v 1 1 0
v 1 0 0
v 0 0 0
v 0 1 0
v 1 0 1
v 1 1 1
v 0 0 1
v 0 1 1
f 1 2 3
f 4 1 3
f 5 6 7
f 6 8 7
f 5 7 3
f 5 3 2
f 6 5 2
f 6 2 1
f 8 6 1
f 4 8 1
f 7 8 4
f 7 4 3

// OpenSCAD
union()polyhedron(
[[0,0,0],[1,0,0],[1,1,0],[0,1,0],[0,0,1],[1,0,1],[1,1,1],[0,1,1]],

[[0,1,2],[0,2,3],[4,6,5],[4,7,6],
    [0,4,5],[1,0,5],[1,5,6],[2,1,6],
    [2,6,7],[2,7,3],[3,7,4],[0,3,4]]);
//    0123
//    4567
